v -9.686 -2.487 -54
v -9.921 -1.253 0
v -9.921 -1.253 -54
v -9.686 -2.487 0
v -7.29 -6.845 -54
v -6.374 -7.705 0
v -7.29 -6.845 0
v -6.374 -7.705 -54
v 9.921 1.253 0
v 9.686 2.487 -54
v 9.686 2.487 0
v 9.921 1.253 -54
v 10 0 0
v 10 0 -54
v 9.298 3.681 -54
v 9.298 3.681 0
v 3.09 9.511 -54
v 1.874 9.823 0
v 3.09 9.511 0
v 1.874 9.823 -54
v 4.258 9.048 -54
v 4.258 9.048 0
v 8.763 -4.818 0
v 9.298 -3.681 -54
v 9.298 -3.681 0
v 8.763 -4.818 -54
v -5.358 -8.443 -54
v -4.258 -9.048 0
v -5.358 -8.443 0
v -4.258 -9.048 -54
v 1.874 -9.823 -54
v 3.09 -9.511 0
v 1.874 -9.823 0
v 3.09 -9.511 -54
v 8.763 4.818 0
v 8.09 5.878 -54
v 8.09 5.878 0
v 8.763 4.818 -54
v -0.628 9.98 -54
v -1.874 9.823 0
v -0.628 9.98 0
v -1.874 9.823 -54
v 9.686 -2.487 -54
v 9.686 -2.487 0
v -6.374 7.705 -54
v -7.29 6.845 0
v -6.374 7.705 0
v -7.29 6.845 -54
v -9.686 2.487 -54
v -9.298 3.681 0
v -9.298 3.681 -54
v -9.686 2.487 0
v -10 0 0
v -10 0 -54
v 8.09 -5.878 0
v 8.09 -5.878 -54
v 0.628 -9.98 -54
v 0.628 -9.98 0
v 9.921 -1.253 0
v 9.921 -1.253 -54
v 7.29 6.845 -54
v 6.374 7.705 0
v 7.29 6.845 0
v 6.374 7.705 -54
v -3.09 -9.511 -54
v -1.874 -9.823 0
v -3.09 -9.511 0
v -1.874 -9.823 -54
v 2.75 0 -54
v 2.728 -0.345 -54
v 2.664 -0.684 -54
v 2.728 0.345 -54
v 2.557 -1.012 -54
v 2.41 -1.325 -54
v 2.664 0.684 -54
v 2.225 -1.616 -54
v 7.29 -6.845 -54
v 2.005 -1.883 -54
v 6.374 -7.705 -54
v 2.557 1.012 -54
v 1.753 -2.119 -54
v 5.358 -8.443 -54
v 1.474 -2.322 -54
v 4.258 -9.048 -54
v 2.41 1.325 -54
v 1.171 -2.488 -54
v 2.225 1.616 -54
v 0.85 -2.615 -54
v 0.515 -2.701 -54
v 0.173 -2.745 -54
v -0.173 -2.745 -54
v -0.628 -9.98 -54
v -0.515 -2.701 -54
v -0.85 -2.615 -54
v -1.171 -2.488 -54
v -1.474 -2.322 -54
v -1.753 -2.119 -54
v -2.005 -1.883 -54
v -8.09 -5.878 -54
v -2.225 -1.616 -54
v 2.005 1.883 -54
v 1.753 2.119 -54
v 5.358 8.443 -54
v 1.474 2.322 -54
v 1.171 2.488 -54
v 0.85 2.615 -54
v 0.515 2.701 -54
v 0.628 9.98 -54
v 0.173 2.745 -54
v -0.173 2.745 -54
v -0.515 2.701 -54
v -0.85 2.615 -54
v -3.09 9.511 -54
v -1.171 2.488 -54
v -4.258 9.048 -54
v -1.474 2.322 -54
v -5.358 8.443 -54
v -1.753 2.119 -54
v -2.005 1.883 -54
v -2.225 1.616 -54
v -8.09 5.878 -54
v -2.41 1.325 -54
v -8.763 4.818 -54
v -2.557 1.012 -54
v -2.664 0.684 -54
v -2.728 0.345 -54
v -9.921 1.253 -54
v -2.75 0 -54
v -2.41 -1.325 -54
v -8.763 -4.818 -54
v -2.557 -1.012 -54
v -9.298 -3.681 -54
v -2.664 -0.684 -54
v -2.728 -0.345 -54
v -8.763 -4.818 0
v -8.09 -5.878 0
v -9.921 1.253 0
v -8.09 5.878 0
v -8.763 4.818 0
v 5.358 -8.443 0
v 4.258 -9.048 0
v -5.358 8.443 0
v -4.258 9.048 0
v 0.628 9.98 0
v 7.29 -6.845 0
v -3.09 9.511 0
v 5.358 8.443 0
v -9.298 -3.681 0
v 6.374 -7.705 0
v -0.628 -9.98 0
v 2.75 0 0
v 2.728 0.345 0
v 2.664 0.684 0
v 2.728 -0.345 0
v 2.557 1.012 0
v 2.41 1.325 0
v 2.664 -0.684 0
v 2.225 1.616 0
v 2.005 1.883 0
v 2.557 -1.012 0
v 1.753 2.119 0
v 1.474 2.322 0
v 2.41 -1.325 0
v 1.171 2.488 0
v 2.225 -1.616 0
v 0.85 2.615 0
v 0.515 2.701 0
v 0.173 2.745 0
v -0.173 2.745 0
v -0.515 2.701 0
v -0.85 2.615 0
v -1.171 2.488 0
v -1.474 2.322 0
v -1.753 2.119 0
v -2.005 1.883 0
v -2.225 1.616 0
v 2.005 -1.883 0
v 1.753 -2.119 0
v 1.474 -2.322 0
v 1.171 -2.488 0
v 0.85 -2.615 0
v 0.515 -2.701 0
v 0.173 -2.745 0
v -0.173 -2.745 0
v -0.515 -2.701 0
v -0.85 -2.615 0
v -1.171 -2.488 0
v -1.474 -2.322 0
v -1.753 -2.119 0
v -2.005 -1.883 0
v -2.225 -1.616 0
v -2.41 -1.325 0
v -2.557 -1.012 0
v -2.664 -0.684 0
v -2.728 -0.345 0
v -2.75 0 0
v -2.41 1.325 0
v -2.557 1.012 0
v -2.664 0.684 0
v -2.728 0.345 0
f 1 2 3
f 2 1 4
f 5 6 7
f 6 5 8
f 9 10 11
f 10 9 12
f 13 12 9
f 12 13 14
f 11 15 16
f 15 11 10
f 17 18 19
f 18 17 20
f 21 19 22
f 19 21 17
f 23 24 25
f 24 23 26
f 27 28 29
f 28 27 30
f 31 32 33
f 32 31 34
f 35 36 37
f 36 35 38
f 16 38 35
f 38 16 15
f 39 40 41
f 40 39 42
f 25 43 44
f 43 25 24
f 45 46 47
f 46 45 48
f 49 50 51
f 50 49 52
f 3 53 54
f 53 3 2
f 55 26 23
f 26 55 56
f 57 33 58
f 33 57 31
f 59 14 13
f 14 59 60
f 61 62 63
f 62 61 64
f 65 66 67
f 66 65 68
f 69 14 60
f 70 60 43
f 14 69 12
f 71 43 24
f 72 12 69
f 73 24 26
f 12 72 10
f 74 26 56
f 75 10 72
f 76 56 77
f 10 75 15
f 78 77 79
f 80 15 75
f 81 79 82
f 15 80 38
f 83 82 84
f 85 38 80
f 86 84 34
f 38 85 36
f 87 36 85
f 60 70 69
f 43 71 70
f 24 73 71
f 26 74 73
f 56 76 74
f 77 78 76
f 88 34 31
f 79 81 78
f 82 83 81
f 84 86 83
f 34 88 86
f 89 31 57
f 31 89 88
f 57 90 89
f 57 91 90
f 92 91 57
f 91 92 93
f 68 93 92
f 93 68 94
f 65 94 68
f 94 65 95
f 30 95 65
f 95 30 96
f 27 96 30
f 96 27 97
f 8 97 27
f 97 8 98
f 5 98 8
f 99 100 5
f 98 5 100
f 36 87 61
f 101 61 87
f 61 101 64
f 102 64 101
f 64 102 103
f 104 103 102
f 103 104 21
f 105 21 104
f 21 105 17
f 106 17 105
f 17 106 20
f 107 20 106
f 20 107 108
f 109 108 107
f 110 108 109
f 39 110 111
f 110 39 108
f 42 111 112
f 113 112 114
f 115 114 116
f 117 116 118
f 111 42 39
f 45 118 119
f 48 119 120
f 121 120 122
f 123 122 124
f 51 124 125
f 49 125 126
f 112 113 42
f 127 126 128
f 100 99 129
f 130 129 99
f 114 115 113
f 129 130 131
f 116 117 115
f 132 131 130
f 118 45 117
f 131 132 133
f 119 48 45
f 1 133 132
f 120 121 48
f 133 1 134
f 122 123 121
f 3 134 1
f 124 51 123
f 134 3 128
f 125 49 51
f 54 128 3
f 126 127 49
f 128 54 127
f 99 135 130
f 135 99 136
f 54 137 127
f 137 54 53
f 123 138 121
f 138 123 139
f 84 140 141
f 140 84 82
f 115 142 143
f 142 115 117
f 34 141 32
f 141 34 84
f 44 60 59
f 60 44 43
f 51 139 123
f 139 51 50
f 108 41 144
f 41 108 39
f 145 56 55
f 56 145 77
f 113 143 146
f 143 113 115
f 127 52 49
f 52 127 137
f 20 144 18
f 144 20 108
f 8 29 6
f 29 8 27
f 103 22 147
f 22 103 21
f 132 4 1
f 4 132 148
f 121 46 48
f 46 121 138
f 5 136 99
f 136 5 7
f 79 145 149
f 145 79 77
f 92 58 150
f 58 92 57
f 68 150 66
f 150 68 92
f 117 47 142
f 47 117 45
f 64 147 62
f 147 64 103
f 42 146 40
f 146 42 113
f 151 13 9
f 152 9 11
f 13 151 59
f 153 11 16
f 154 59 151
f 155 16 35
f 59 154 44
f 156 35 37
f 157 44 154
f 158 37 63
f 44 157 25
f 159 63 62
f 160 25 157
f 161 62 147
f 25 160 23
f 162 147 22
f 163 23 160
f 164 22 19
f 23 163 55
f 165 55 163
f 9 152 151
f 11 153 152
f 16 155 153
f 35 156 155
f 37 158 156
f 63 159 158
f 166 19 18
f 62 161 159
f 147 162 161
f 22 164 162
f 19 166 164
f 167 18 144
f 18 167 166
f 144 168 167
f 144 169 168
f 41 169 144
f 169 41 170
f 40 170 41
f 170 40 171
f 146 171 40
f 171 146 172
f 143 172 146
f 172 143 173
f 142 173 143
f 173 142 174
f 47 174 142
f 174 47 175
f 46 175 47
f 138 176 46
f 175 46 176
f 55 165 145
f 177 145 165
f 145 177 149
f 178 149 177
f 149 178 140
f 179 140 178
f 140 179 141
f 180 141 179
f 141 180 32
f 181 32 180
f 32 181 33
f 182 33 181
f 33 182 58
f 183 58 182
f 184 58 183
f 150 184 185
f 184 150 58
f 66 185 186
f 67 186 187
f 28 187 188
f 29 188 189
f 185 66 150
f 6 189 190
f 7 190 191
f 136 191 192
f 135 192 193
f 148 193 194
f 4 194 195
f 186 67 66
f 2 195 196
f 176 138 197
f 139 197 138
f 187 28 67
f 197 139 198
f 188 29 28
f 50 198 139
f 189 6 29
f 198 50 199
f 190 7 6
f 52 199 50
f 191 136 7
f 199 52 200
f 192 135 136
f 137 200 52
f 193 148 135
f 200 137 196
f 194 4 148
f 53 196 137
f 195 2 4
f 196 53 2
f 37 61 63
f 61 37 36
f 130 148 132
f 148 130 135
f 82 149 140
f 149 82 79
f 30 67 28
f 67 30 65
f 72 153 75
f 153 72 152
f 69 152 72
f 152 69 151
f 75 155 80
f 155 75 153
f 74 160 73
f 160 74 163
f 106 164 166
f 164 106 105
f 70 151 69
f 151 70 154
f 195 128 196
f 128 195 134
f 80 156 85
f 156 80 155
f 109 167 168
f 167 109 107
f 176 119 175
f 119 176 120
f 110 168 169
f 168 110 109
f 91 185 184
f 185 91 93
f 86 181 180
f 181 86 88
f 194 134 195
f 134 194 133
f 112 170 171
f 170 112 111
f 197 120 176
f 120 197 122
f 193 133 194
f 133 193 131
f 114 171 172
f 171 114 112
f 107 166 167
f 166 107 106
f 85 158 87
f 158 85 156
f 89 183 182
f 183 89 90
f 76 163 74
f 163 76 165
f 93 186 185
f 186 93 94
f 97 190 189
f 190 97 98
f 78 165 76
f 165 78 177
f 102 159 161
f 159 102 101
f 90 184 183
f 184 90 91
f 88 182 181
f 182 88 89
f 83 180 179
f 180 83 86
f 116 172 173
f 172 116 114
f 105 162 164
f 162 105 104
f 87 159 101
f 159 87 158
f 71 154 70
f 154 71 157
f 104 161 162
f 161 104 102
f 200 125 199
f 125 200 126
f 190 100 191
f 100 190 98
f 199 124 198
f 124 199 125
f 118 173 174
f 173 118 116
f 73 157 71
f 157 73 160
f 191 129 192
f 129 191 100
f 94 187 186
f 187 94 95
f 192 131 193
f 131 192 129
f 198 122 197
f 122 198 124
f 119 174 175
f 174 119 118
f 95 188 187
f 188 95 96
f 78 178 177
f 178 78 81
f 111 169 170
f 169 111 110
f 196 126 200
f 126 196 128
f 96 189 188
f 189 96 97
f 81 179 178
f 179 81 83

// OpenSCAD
$fn = 50;


difference() {
	union() {
		translate(v = [0, 0, -54.0000000000]) {
			cylinder(h = 54, r = 10.0000000000);
		}
		cylinder(h = 0, r = 20.0000000000);
	}
	union() {
		#translate(v = [0, 0, -54]) {
			cylinder(h = 54, r = 2.7500000000);
		}
	}
}
